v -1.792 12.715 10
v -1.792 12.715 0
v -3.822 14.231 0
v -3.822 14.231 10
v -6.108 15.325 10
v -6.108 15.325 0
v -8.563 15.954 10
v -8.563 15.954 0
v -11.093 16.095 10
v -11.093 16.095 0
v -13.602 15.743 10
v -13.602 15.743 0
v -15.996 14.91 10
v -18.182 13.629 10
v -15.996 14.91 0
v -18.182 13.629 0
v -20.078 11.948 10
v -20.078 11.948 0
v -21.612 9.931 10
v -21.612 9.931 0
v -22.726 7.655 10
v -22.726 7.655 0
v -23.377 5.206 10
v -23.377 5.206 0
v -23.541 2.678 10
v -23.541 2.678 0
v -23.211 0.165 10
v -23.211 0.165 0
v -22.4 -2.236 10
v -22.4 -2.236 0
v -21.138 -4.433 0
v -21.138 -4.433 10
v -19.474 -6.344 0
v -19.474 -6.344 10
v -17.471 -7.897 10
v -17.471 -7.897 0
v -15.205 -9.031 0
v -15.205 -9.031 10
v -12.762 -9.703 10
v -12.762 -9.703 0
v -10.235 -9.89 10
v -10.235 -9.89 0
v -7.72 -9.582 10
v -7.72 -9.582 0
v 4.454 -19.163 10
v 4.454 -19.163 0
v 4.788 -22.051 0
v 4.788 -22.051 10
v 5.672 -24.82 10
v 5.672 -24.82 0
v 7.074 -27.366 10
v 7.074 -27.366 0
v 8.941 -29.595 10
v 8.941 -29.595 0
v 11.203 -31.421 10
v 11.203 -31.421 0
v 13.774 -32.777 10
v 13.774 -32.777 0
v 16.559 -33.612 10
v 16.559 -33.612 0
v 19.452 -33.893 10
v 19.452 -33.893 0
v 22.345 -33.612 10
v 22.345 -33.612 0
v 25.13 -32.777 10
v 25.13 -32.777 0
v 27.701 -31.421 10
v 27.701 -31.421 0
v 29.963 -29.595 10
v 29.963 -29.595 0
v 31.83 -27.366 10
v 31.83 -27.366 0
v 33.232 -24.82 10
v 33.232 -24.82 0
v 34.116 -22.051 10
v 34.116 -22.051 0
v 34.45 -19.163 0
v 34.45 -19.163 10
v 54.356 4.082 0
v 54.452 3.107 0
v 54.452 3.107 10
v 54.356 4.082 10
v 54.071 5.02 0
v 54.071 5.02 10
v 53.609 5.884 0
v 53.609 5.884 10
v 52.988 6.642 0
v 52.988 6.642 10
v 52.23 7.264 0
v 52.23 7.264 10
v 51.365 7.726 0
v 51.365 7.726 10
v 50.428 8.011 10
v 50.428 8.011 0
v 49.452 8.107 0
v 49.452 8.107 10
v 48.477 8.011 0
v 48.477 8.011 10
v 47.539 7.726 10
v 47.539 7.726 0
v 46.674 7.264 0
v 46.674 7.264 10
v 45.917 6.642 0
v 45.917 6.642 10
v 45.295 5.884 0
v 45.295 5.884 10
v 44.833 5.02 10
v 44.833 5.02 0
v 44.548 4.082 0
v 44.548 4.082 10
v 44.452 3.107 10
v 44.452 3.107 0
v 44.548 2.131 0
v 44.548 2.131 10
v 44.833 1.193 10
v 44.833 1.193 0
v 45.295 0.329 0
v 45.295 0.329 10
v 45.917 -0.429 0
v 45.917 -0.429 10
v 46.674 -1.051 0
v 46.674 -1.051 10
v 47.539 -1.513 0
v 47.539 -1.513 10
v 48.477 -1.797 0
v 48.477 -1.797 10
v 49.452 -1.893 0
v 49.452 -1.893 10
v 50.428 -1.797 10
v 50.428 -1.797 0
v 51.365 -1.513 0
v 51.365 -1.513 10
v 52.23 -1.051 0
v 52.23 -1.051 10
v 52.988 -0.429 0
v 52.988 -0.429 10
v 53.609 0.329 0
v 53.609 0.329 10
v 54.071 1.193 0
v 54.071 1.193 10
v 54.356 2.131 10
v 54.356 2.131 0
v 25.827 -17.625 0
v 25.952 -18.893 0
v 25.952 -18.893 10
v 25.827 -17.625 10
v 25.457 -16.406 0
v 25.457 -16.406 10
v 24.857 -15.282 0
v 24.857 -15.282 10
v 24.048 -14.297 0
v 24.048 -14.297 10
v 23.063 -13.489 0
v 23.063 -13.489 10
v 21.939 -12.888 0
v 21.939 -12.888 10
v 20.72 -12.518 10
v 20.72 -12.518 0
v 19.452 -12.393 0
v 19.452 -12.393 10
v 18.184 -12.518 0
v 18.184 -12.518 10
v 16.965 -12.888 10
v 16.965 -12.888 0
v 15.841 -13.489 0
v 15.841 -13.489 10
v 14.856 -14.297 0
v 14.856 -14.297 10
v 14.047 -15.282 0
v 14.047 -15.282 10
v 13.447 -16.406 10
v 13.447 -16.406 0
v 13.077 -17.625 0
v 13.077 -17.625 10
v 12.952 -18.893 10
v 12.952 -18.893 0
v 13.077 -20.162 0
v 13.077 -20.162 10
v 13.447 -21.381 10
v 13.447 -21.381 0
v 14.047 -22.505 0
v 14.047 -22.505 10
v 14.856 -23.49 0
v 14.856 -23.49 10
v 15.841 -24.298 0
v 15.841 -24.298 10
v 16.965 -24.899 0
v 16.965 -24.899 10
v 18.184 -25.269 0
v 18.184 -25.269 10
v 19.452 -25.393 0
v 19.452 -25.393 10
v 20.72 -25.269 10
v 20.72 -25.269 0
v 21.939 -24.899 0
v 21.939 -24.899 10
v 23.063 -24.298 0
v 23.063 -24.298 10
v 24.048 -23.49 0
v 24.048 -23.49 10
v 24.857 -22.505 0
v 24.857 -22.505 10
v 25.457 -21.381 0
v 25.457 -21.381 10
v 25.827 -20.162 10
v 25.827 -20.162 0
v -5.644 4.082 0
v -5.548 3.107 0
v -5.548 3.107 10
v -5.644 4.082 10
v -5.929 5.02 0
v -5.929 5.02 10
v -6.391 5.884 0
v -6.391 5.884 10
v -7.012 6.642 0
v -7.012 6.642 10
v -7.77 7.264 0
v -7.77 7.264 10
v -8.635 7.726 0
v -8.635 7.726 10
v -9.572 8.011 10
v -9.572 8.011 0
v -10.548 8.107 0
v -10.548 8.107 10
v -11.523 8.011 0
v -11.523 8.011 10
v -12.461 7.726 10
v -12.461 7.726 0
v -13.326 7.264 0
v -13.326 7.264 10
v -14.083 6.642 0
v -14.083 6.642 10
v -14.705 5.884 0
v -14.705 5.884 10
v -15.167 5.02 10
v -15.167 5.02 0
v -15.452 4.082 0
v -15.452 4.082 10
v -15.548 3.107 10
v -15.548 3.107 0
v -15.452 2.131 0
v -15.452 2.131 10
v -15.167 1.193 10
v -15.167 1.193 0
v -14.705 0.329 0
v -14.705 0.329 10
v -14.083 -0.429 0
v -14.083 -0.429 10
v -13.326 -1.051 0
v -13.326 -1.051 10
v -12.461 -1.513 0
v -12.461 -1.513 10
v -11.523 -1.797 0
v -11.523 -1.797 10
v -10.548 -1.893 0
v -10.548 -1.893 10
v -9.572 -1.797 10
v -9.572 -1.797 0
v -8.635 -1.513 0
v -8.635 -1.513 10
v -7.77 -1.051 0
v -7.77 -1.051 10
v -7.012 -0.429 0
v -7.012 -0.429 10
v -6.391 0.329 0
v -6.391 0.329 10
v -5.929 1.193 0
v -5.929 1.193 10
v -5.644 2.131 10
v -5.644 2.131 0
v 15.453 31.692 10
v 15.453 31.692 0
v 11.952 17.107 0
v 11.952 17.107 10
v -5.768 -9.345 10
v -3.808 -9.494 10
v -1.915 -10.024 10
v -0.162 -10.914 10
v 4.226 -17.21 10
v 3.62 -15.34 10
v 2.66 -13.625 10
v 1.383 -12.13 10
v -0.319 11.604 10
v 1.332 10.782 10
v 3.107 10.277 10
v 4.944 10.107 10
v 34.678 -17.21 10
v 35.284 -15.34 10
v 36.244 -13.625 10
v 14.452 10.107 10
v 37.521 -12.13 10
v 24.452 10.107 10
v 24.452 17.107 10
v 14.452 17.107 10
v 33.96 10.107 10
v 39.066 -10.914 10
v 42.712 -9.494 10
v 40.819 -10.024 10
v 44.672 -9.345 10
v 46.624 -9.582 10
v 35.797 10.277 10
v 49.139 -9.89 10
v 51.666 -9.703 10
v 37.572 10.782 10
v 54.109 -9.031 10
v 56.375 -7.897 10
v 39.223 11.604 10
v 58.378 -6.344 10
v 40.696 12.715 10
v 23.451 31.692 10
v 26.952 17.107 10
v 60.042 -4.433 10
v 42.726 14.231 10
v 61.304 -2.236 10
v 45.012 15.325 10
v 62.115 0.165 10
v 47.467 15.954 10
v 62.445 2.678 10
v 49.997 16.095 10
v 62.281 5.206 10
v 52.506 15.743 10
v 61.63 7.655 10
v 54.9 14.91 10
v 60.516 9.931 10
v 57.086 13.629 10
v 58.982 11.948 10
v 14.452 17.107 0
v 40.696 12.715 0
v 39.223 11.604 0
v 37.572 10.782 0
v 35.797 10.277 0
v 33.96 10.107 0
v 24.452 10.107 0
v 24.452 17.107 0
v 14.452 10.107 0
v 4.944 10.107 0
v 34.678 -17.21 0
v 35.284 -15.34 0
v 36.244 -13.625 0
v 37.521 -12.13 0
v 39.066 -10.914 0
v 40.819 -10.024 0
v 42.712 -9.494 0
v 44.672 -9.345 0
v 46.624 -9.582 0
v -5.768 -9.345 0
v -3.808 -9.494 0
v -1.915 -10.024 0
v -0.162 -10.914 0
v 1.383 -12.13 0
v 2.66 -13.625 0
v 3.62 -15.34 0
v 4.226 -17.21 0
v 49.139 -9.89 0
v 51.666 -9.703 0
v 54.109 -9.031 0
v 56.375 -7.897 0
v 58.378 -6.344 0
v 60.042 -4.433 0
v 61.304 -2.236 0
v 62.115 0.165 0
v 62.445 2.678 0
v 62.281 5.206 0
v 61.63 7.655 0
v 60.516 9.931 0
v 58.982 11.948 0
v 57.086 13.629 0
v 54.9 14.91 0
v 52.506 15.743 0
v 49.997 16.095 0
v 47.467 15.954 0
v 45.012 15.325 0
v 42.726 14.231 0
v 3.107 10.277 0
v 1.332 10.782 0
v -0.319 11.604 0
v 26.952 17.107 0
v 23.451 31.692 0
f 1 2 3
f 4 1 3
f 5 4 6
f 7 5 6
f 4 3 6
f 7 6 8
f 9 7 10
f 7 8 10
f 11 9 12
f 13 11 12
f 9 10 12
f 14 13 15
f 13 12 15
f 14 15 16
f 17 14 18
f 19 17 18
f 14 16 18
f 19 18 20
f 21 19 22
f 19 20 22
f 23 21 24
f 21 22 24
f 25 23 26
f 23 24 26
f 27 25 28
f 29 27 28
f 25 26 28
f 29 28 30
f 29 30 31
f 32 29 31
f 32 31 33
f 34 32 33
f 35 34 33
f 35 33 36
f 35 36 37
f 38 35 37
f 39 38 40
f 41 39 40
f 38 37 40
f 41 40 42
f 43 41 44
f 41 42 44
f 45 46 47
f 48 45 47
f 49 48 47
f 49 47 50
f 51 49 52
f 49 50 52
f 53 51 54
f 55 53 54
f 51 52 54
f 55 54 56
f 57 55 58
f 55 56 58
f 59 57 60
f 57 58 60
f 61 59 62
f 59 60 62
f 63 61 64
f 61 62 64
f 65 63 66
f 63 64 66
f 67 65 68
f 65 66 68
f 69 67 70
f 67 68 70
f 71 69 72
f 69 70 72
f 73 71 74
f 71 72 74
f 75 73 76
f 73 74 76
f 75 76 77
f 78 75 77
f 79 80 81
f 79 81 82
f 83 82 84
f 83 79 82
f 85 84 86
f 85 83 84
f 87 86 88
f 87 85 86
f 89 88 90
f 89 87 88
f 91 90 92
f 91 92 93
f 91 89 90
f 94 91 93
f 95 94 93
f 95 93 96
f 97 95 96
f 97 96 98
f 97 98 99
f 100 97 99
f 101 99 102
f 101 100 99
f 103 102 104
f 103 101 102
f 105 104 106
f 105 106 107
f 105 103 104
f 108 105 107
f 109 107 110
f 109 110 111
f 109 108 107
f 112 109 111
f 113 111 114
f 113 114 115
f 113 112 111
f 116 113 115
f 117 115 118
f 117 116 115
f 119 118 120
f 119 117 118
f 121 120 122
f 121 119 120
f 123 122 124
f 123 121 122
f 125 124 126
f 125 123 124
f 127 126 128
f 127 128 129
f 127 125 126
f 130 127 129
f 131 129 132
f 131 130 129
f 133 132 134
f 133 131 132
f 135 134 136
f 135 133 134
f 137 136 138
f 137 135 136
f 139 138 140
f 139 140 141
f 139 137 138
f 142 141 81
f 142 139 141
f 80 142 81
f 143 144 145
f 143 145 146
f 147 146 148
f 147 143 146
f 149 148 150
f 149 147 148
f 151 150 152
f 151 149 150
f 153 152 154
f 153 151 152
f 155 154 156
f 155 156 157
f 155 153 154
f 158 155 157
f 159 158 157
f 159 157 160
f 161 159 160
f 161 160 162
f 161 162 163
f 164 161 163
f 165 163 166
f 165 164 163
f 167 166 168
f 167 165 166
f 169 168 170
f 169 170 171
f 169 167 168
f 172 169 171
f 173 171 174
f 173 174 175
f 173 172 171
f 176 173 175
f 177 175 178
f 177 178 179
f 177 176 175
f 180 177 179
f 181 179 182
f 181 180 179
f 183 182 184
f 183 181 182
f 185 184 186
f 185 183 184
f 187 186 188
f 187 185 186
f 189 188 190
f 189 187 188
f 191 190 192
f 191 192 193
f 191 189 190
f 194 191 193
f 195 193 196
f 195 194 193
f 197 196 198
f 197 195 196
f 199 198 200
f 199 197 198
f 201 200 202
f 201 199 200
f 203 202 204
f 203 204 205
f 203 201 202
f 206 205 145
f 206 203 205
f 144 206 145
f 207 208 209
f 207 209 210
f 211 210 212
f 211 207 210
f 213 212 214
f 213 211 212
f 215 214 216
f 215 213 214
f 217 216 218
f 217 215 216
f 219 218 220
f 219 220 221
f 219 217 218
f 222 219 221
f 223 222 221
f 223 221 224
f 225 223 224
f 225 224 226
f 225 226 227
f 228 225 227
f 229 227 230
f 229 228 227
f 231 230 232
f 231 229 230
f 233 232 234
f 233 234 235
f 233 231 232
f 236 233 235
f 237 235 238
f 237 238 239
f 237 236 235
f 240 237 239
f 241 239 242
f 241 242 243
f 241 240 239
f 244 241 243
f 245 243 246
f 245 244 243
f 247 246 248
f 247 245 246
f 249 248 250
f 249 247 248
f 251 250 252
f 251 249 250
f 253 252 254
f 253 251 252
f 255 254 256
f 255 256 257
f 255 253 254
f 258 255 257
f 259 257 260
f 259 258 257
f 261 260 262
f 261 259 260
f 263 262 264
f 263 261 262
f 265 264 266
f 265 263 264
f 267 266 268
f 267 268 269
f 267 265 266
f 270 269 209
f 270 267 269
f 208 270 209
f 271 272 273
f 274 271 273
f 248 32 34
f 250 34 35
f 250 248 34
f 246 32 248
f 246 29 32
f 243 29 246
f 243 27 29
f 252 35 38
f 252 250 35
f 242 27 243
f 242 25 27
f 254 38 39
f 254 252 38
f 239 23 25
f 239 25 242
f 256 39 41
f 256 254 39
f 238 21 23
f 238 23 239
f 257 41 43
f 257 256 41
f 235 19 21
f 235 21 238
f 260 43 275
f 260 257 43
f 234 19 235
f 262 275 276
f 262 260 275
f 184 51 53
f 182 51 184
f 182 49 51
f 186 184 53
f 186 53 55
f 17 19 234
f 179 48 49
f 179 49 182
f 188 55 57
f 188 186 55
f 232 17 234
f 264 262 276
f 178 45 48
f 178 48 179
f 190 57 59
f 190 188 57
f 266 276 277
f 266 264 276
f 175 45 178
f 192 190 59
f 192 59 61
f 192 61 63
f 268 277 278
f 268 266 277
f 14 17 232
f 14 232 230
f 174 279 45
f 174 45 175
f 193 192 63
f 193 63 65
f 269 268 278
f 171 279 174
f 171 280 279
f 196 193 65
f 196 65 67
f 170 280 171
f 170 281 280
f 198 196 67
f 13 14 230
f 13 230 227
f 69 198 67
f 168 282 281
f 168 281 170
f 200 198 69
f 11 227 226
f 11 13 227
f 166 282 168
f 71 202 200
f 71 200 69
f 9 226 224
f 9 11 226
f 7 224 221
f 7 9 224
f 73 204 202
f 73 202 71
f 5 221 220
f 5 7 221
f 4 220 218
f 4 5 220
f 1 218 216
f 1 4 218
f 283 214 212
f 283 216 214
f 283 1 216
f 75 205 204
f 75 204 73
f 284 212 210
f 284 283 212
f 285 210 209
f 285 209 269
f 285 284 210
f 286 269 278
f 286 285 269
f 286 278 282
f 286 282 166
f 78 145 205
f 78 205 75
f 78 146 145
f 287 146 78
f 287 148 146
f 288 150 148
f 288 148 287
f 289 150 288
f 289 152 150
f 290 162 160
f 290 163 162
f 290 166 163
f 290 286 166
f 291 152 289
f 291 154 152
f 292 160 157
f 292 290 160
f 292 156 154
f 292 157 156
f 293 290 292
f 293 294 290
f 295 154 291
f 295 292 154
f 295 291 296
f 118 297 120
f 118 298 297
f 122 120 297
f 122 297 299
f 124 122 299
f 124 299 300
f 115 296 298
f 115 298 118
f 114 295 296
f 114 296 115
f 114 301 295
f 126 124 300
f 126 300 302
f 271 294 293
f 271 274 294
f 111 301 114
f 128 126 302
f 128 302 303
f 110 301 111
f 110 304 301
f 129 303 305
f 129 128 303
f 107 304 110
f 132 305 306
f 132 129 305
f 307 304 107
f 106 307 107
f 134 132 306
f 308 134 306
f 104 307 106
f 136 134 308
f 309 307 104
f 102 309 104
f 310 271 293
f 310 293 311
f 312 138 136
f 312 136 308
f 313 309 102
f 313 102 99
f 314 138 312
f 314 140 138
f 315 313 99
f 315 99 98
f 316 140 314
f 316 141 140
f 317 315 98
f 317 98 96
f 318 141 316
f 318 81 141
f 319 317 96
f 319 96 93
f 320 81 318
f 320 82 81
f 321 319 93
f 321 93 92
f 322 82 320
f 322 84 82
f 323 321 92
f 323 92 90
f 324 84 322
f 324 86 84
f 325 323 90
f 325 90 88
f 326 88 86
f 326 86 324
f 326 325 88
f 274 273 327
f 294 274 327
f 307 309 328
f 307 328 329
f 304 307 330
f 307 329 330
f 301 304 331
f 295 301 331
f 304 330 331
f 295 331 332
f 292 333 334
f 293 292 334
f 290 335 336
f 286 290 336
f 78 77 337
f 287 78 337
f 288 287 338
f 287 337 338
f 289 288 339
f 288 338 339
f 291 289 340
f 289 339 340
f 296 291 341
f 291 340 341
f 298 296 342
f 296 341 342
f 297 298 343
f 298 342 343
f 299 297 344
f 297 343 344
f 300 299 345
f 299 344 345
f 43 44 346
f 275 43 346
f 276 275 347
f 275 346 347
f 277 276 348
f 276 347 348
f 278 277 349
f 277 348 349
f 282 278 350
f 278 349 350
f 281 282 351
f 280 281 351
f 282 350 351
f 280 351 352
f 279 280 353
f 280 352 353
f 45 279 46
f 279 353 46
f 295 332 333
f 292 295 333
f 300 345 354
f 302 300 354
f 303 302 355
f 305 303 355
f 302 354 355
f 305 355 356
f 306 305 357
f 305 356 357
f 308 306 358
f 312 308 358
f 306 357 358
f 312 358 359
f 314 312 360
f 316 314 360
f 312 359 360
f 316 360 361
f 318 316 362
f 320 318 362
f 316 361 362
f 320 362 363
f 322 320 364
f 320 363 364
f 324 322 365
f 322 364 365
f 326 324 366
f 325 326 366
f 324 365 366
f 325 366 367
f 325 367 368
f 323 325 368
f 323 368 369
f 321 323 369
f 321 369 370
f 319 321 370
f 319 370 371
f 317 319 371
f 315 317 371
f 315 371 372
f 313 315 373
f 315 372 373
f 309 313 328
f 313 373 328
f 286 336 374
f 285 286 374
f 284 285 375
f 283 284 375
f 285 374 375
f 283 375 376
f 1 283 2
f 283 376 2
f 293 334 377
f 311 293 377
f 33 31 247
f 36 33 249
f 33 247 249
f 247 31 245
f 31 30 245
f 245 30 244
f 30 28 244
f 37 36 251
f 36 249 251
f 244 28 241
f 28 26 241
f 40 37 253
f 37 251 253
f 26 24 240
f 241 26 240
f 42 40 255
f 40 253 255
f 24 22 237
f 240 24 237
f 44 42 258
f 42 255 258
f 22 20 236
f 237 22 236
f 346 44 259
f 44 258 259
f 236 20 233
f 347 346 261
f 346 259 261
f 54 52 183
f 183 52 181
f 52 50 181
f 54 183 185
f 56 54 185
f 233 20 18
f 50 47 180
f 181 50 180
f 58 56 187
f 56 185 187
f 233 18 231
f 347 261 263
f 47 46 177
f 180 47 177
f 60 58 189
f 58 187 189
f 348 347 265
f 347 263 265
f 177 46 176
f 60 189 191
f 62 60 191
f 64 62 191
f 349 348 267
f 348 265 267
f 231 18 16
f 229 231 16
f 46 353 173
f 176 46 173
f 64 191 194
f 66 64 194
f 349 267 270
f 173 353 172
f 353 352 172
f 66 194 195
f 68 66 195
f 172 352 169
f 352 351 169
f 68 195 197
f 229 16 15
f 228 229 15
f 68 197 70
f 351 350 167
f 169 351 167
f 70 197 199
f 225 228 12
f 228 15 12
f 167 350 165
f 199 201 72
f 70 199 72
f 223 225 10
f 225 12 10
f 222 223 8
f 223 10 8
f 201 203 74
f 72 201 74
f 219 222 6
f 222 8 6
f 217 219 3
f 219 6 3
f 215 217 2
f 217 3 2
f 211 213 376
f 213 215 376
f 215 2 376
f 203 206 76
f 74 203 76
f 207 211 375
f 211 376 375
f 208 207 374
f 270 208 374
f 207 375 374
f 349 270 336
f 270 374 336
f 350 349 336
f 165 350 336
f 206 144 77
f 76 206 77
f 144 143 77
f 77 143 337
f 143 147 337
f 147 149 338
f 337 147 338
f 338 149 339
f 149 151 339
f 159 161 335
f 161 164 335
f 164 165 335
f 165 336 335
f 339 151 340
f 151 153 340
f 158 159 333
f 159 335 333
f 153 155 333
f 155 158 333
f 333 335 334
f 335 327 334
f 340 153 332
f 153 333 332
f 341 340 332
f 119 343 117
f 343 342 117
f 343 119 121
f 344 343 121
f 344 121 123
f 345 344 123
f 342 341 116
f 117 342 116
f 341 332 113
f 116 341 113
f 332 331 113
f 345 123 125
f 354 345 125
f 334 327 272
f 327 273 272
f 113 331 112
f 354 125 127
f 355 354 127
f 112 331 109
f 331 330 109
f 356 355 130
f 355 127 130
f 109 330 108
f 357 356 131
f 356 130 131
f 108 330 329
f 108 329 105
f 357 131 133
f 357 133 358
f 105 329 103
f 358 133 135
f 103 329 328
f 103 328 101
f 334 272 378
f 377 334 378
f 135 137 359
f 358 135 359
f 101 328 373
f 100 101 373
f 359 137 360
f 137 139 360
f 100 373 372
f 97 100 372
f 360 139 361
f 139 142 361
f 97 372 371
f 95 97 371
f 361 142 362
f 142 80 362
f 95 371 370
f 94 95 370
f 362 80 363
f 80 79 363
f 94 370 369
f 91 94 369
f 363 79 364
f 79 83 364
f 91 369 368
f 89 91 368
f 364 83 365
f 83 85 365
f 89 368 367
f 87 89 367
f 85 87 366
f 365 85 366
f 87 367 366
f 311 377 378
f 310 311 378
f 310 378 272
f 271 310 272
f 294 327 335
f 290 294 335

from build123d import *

# Parameters (mm, degrees)
SKETCH1_R           = 5
SKETCH1_R_2         = 6.5
BOSS_EXTRUDE1_DEPTH = 10


with BuildPart() as part:
    # Sketch1 → Boss-Extrude1 (new body)
    with BuildSketch(Plane.XY):
        with BuildLine():
            Line((14.452049987, 10.106578028), (4.943983372, 10.106578028))
            ThreePointArc((4.943983372, 10.106578028), (1.33240778, 10.781529946), (-1.791639839, 12.715273681))
            ThreePointArc((-1.791639839, 12.715273681), (-23.111525629, 6.446722896), (-7.719583441, -9.58201301))
            ThreePointArc((-7.719583441, -9.58201301), (0.640486438, -11.484150022), (4.454469887, -19.162849381))
            ThreePointArc((4.454469887, -19.162849381), (19.452049987, -33.893421972), (34.449630088, -19.162849381))
            ThreePointArc((34.449630088, -19.162849381), (38.263613537, -11.484150022), (46.623683415, -9.58201301))
            ThreePointArc((46.623683415, -9.58201301), (62.015625604, 6.446722896), (40.695739813, 12.715273681))
            ThreePointArc((40.695739813, 12.715273681), (37.571692195, 10.781529946), (33.960116603, 10.106578028))
            Line((33.960116603, 10.106578028), (24.452049987, 10.106578028))
            Line((24.452049987, 10.106578028), (24.452049987, 17.106578028))
            Line((24.452049987, 17.106578028), (26.952049987, 17.106578028))
            Line((26.952049987, 17.106578028), (23.451304138, 31.692351182))
            Line((23.451304138, 31.692351182), (19.452049987, 31.692351182))
            Line((19.452049987, 31.692351182), (15.452795837, 31.692351182))
            Line((15.452795837, 31.692351182), (11.952049987, 17.106578028))
            Line((11.952049987, 17.106578028), (14.452049987, 17.106578028))
            Line((14.452049987, 17.106578028), (14.452049987, 10.106578028))
        make_face()
        with Locations((-10.547950013, 3.106578028)):
            Circle(SKETCH1_R, mode=Mode.SUBTRACT)
        with Locations((49.452049987, 3.106578028)):
            Circle(SKETCH1_R, mode=Mode.SUBTRACT)
        with Locations((19.452049987, -18.893421972)):
            Circle(SKETCH1_R_2, mode=Mode.SUBTRACT)
    extrude(amount=BOSS_EXTRUDE1_DEPTH)


solid = part.part
